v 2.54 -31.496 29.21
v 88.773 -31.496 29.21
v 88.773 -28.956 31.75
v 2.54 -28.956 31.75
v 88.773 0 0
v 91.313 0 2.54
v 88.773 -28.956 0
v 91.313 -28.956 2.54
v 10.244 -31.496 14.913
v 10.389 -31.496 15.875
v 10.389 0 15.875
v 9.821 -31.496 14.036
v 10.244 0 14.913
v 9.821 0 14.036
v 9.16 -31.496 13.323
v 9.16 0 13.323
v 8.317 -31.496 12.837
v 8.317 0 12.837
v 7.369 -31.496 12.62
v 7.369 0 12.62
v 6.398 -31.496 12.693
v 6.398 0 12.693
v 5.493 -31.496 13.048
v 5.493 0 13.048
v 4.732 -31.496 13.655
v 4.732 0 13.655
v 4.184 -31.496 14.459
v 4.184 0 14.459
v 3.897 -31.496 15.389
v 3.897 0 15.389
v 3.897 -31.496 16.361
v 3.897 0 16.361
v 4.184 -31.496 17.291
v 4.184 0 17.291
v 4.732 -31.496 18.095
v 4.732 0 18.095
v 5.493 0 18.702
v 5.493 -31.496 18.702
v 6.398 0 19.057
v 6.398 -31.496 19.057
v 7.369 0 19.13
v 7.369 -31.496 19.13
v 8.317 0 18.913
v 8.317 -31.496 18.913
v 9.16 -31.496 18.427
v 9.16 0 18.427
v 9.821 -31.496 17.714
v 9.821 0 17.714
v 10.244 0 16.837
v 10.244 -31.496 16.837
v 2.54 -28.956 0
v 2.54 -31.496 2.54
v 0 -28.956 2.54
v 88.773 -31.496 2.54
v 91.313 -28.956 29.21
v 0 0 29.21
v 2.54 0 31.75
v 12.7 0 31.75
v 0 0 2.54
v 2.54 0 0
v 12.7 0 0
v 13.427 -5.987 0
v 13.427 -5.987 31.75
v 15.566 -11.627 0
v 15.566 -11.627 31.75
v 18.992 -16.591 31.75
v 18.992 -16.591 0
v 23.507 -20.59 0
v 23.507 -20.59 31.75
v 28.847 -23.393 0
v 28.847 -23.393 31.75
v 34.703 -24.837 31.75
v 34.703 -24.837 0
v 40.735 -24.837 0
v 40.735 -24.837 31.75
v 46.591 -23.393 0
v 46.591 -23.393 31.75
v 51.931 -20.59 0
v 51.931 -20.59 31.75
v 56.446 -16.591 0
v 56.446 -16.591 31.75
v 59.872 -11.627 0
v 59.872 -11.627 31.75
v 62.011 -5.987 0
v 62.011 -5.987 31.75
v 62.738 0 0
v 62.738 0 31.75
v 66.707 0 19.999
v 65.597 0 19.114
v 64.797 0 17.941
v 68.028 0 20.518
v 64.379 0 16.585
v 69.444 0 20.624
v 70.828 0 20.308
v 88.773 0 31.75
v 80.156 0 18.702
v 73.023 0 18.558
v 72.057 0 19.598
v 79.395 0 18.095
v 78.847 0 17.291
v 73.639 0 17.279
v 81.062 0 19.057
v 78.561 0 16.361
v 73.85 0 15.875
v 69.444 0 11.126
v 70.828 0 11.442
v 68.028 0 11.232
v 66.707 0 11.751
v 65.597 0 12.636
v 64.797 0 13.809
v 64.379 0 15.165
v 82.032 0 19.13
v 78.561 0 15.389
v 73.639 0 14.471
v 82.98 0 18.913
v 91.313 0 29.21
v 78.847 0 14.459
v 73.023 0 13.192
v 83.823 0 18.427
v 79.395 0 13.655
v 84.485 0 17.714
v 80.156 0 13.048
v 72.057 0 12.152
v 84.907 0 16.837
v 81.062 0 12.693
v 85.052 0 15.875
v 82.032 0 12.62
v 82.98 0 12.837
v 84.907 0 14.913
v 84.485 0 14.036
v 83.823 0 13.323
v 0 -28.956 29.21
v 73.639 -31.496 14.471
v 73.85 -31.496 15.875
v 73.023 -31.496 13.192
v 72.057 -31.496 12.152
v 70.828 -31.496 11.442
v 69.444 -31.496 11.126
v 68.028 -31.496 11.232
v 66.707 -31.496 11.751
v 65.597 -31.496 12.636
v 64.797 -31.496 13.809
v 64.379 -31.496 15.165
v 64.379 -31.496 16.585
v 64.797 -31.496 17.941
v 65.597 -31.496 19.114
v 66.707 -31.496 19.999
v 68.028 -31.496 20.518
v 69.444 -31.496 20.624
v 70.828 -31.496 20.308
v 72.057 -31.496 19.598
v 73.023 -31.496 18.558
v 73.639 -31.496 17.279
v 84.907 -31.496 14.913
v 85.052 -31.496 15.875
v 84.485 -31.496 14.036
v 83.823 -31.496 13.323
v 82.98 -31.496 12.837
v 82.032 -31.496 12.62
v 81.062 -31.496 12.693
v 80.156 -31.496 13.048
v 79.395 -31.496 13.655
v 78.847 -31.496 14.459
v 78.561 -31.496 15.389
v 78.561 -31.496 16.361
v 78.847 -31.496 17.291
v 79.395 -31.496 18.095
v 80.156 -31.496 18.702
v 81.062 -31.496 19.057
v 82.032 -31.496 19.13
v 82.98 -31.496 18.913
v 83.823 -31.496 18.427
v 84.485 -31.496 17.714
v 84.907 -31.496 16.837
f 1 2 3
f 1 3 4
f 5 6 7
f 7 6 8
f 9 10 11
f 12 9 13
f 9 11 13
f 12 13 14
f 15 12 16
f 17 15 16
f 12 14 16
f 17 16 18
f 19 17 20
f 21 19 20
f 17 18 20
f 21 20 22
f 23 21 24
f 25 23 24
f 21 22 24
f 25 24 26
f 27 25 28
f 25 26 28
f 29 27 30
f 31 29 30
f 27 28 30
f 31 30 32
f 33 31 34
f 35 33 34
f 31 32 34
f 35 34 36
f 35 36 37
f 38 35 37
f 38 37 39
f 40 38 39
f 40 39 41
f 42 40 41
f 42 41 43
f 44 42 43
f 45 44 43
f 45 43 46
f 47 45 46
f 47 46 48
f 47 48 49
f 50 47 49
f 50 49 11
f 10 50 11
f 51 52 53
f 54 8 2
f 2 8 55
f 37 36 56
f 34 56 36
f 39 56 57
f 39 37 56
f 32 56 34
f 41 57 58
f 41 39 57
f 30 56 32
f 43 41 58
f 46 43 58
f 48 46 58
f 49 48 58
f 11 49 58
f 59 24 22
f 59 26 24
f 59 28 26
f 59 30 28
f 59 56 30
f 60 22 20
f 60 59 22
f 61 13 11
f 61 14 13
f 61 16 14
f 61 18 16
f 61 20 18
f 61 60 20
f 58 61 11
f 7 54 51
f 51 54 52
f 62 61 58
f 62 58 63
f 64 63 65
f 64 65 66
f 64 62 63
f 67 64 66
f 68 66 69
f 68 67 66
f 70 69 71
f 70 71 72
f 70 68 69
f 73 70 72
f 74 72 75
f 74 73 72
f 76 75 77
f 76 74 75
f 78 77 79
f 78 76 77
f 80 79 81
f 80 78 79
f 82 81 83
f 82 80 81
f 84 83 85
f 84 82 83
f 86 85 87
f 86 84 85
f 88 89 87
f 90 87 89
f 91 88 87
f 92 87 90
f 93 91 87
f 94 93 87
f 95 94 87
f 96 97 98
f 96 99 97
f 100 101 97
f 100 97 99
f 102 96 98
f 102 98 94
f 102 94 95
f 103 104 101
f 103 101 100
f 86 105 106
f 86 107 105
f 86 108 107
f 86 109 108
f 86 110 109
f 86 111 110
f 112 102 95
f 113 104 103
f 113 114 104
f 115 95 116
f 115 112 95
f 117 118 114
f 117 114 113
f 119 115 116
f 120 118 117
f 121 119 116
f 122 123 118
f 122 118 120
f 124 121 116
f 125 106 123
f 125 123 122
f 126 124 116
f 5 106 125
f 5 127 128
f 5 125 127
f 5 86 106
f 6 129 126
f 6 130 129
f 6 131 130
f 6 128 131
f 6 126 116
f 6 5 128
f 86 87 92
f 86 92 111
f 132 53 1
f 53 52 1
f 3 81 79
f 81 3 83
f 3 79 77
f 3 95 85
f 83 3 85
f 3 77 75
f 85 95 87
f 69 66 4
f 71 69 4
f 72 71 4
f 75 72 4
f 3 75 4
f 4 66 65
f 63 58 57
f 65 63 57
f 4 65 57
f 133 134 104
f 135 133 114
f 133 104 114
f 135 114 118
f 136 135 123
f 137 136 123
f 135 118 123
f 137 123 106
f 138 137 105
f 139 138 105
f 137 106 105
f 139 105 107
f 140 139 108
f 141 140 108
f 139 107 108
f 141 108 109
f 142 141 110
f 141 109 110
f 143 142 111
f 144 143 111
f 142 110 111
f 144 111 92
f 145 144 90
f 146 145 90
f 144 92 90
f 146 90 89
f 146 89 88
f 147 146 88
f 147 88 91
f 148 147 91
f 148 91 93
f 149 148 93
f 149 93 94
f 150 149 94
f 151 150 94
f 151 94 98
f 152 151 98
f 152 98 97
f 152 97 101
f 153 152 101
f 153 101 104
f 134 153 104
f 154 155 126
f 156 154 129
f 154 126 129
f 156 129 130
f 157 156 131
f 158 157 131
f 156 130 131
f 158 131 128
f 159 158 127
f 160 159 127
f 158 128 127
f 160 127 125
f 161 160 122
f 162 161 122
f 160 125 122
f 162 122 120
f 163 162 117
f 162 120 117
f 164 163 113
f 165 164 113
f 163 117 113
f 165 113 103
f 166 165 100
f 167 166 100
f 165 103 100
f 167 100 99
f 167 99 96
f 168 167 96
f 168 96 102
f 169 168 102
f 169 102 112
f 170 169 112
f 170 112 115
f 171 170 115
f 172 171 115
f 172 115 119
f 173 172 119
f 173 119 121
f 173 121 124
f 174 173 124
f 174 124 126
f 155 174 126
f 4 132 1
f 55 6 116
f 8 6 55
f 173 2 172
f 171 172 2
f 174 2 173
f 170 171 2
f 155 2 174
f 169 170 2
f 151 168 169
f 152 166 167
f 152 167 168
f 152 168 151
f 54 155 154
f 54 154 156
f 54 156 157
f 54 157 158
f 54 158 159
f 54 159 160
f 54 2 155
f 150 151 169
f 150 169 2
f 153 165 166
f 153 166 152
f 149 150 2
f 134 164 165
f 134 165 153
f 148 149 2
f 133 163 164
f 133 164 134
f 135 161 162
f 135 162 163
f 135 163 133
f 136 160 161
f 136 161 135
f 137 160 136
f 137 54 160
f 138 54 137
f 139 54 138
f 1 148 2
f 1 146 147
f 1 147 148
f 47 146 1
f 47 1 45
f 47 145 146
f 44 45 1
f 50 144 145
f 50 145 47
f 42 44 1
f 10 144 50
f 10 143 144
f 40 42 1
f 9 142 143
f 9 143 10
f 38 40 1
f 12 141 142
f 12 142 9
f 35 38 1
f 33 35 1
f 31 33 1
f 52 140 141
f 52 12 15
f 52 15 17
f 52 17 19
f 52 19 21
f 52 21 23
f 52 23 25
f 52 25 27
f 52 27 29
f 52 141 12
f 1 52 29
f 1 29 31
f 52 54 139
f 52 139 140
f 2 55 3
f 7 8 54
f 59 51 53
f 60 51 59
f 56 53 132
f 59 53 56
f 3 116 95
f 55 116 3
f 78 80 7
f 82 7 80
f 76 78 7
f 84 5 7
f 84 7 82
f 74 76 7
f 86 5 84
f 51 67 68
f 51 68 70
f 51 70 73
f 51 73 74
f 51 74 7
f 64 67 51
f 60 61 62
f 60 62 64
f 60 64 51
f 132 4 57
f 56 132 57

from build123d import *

# Parameters (mm, degrees)
BOSS_EXTRUDE1_DEPTH                 = 31.75
F_5_16_18_TAPPED_HOLE1_D            = 6.5278
F_3_8_0_375_CLEARANCE_DOWEL_HOLE2_D = 9.525
CHAMFER1_SIZE                       = 2.54


with BuildPart() as part:
    # Sketch1 → Boss-Extrude1 (new body)
    with BuildSketch(Plane.XY):
        with BuildLine():
            Line((0, 0), (12.7, 0))
            ThreePointArc((12.7, 0), (37.719, -25.019), (62.738, 0))
            Line((62.738, 0), (91.313, 0))
            Line((91.313, 0), (91.313, -31.496))
            Line((91.313, -31.496), (0, -31.496))
            Line((0, -31.496), (0, 0))
        make_face()
    extrude(amount=BOSS_EXTRUDE1_DEPTH)

    # 5/16-18 Tapped Hole1 (through all)
    with Locations(Plane(origin=(0, -31.496, 0), x_dir=(-1, 0, 0), z_dir=(0, -1, 0))):
        with Locations((-7.1247, -15.875), (-81.788, -15.875)):
            Hole(F_5_16_18_TAPPED_HOLE1_D / 2)

    # 3/8 (0.375) Clearance Dowel Hole2 (through all)
    with Locations(Plane(origin=(0, -31.496, 0), x_dir=(-1, 0, 0), z_dir=(0, -1, 0))):
        with Locations((-69.088, -15.875)):
            Hole(F_3_8_0_375_CLEARANCE_DOWEL_HOLE2_D / 2)

    # Chamfer1
    chamfer1_edges = [part.edges().sort_by_distance(p)[0] for p in [
        (91.313, -15.748, 31.75),
        (91.313, -31.496, 15.875),
        (0, -31.496, 15.875),
        (0, -15.748, 31.75),
        (45.6565, -31.496, 31.75),
        (91.313, -15.748, 0),
        (45.6565, -31.496, 0),
        (0, -15.748, 0),
    ]]
    chamfer(chamfer1_edges, length=CHAMFER1_SIZE)


solid = part.part
